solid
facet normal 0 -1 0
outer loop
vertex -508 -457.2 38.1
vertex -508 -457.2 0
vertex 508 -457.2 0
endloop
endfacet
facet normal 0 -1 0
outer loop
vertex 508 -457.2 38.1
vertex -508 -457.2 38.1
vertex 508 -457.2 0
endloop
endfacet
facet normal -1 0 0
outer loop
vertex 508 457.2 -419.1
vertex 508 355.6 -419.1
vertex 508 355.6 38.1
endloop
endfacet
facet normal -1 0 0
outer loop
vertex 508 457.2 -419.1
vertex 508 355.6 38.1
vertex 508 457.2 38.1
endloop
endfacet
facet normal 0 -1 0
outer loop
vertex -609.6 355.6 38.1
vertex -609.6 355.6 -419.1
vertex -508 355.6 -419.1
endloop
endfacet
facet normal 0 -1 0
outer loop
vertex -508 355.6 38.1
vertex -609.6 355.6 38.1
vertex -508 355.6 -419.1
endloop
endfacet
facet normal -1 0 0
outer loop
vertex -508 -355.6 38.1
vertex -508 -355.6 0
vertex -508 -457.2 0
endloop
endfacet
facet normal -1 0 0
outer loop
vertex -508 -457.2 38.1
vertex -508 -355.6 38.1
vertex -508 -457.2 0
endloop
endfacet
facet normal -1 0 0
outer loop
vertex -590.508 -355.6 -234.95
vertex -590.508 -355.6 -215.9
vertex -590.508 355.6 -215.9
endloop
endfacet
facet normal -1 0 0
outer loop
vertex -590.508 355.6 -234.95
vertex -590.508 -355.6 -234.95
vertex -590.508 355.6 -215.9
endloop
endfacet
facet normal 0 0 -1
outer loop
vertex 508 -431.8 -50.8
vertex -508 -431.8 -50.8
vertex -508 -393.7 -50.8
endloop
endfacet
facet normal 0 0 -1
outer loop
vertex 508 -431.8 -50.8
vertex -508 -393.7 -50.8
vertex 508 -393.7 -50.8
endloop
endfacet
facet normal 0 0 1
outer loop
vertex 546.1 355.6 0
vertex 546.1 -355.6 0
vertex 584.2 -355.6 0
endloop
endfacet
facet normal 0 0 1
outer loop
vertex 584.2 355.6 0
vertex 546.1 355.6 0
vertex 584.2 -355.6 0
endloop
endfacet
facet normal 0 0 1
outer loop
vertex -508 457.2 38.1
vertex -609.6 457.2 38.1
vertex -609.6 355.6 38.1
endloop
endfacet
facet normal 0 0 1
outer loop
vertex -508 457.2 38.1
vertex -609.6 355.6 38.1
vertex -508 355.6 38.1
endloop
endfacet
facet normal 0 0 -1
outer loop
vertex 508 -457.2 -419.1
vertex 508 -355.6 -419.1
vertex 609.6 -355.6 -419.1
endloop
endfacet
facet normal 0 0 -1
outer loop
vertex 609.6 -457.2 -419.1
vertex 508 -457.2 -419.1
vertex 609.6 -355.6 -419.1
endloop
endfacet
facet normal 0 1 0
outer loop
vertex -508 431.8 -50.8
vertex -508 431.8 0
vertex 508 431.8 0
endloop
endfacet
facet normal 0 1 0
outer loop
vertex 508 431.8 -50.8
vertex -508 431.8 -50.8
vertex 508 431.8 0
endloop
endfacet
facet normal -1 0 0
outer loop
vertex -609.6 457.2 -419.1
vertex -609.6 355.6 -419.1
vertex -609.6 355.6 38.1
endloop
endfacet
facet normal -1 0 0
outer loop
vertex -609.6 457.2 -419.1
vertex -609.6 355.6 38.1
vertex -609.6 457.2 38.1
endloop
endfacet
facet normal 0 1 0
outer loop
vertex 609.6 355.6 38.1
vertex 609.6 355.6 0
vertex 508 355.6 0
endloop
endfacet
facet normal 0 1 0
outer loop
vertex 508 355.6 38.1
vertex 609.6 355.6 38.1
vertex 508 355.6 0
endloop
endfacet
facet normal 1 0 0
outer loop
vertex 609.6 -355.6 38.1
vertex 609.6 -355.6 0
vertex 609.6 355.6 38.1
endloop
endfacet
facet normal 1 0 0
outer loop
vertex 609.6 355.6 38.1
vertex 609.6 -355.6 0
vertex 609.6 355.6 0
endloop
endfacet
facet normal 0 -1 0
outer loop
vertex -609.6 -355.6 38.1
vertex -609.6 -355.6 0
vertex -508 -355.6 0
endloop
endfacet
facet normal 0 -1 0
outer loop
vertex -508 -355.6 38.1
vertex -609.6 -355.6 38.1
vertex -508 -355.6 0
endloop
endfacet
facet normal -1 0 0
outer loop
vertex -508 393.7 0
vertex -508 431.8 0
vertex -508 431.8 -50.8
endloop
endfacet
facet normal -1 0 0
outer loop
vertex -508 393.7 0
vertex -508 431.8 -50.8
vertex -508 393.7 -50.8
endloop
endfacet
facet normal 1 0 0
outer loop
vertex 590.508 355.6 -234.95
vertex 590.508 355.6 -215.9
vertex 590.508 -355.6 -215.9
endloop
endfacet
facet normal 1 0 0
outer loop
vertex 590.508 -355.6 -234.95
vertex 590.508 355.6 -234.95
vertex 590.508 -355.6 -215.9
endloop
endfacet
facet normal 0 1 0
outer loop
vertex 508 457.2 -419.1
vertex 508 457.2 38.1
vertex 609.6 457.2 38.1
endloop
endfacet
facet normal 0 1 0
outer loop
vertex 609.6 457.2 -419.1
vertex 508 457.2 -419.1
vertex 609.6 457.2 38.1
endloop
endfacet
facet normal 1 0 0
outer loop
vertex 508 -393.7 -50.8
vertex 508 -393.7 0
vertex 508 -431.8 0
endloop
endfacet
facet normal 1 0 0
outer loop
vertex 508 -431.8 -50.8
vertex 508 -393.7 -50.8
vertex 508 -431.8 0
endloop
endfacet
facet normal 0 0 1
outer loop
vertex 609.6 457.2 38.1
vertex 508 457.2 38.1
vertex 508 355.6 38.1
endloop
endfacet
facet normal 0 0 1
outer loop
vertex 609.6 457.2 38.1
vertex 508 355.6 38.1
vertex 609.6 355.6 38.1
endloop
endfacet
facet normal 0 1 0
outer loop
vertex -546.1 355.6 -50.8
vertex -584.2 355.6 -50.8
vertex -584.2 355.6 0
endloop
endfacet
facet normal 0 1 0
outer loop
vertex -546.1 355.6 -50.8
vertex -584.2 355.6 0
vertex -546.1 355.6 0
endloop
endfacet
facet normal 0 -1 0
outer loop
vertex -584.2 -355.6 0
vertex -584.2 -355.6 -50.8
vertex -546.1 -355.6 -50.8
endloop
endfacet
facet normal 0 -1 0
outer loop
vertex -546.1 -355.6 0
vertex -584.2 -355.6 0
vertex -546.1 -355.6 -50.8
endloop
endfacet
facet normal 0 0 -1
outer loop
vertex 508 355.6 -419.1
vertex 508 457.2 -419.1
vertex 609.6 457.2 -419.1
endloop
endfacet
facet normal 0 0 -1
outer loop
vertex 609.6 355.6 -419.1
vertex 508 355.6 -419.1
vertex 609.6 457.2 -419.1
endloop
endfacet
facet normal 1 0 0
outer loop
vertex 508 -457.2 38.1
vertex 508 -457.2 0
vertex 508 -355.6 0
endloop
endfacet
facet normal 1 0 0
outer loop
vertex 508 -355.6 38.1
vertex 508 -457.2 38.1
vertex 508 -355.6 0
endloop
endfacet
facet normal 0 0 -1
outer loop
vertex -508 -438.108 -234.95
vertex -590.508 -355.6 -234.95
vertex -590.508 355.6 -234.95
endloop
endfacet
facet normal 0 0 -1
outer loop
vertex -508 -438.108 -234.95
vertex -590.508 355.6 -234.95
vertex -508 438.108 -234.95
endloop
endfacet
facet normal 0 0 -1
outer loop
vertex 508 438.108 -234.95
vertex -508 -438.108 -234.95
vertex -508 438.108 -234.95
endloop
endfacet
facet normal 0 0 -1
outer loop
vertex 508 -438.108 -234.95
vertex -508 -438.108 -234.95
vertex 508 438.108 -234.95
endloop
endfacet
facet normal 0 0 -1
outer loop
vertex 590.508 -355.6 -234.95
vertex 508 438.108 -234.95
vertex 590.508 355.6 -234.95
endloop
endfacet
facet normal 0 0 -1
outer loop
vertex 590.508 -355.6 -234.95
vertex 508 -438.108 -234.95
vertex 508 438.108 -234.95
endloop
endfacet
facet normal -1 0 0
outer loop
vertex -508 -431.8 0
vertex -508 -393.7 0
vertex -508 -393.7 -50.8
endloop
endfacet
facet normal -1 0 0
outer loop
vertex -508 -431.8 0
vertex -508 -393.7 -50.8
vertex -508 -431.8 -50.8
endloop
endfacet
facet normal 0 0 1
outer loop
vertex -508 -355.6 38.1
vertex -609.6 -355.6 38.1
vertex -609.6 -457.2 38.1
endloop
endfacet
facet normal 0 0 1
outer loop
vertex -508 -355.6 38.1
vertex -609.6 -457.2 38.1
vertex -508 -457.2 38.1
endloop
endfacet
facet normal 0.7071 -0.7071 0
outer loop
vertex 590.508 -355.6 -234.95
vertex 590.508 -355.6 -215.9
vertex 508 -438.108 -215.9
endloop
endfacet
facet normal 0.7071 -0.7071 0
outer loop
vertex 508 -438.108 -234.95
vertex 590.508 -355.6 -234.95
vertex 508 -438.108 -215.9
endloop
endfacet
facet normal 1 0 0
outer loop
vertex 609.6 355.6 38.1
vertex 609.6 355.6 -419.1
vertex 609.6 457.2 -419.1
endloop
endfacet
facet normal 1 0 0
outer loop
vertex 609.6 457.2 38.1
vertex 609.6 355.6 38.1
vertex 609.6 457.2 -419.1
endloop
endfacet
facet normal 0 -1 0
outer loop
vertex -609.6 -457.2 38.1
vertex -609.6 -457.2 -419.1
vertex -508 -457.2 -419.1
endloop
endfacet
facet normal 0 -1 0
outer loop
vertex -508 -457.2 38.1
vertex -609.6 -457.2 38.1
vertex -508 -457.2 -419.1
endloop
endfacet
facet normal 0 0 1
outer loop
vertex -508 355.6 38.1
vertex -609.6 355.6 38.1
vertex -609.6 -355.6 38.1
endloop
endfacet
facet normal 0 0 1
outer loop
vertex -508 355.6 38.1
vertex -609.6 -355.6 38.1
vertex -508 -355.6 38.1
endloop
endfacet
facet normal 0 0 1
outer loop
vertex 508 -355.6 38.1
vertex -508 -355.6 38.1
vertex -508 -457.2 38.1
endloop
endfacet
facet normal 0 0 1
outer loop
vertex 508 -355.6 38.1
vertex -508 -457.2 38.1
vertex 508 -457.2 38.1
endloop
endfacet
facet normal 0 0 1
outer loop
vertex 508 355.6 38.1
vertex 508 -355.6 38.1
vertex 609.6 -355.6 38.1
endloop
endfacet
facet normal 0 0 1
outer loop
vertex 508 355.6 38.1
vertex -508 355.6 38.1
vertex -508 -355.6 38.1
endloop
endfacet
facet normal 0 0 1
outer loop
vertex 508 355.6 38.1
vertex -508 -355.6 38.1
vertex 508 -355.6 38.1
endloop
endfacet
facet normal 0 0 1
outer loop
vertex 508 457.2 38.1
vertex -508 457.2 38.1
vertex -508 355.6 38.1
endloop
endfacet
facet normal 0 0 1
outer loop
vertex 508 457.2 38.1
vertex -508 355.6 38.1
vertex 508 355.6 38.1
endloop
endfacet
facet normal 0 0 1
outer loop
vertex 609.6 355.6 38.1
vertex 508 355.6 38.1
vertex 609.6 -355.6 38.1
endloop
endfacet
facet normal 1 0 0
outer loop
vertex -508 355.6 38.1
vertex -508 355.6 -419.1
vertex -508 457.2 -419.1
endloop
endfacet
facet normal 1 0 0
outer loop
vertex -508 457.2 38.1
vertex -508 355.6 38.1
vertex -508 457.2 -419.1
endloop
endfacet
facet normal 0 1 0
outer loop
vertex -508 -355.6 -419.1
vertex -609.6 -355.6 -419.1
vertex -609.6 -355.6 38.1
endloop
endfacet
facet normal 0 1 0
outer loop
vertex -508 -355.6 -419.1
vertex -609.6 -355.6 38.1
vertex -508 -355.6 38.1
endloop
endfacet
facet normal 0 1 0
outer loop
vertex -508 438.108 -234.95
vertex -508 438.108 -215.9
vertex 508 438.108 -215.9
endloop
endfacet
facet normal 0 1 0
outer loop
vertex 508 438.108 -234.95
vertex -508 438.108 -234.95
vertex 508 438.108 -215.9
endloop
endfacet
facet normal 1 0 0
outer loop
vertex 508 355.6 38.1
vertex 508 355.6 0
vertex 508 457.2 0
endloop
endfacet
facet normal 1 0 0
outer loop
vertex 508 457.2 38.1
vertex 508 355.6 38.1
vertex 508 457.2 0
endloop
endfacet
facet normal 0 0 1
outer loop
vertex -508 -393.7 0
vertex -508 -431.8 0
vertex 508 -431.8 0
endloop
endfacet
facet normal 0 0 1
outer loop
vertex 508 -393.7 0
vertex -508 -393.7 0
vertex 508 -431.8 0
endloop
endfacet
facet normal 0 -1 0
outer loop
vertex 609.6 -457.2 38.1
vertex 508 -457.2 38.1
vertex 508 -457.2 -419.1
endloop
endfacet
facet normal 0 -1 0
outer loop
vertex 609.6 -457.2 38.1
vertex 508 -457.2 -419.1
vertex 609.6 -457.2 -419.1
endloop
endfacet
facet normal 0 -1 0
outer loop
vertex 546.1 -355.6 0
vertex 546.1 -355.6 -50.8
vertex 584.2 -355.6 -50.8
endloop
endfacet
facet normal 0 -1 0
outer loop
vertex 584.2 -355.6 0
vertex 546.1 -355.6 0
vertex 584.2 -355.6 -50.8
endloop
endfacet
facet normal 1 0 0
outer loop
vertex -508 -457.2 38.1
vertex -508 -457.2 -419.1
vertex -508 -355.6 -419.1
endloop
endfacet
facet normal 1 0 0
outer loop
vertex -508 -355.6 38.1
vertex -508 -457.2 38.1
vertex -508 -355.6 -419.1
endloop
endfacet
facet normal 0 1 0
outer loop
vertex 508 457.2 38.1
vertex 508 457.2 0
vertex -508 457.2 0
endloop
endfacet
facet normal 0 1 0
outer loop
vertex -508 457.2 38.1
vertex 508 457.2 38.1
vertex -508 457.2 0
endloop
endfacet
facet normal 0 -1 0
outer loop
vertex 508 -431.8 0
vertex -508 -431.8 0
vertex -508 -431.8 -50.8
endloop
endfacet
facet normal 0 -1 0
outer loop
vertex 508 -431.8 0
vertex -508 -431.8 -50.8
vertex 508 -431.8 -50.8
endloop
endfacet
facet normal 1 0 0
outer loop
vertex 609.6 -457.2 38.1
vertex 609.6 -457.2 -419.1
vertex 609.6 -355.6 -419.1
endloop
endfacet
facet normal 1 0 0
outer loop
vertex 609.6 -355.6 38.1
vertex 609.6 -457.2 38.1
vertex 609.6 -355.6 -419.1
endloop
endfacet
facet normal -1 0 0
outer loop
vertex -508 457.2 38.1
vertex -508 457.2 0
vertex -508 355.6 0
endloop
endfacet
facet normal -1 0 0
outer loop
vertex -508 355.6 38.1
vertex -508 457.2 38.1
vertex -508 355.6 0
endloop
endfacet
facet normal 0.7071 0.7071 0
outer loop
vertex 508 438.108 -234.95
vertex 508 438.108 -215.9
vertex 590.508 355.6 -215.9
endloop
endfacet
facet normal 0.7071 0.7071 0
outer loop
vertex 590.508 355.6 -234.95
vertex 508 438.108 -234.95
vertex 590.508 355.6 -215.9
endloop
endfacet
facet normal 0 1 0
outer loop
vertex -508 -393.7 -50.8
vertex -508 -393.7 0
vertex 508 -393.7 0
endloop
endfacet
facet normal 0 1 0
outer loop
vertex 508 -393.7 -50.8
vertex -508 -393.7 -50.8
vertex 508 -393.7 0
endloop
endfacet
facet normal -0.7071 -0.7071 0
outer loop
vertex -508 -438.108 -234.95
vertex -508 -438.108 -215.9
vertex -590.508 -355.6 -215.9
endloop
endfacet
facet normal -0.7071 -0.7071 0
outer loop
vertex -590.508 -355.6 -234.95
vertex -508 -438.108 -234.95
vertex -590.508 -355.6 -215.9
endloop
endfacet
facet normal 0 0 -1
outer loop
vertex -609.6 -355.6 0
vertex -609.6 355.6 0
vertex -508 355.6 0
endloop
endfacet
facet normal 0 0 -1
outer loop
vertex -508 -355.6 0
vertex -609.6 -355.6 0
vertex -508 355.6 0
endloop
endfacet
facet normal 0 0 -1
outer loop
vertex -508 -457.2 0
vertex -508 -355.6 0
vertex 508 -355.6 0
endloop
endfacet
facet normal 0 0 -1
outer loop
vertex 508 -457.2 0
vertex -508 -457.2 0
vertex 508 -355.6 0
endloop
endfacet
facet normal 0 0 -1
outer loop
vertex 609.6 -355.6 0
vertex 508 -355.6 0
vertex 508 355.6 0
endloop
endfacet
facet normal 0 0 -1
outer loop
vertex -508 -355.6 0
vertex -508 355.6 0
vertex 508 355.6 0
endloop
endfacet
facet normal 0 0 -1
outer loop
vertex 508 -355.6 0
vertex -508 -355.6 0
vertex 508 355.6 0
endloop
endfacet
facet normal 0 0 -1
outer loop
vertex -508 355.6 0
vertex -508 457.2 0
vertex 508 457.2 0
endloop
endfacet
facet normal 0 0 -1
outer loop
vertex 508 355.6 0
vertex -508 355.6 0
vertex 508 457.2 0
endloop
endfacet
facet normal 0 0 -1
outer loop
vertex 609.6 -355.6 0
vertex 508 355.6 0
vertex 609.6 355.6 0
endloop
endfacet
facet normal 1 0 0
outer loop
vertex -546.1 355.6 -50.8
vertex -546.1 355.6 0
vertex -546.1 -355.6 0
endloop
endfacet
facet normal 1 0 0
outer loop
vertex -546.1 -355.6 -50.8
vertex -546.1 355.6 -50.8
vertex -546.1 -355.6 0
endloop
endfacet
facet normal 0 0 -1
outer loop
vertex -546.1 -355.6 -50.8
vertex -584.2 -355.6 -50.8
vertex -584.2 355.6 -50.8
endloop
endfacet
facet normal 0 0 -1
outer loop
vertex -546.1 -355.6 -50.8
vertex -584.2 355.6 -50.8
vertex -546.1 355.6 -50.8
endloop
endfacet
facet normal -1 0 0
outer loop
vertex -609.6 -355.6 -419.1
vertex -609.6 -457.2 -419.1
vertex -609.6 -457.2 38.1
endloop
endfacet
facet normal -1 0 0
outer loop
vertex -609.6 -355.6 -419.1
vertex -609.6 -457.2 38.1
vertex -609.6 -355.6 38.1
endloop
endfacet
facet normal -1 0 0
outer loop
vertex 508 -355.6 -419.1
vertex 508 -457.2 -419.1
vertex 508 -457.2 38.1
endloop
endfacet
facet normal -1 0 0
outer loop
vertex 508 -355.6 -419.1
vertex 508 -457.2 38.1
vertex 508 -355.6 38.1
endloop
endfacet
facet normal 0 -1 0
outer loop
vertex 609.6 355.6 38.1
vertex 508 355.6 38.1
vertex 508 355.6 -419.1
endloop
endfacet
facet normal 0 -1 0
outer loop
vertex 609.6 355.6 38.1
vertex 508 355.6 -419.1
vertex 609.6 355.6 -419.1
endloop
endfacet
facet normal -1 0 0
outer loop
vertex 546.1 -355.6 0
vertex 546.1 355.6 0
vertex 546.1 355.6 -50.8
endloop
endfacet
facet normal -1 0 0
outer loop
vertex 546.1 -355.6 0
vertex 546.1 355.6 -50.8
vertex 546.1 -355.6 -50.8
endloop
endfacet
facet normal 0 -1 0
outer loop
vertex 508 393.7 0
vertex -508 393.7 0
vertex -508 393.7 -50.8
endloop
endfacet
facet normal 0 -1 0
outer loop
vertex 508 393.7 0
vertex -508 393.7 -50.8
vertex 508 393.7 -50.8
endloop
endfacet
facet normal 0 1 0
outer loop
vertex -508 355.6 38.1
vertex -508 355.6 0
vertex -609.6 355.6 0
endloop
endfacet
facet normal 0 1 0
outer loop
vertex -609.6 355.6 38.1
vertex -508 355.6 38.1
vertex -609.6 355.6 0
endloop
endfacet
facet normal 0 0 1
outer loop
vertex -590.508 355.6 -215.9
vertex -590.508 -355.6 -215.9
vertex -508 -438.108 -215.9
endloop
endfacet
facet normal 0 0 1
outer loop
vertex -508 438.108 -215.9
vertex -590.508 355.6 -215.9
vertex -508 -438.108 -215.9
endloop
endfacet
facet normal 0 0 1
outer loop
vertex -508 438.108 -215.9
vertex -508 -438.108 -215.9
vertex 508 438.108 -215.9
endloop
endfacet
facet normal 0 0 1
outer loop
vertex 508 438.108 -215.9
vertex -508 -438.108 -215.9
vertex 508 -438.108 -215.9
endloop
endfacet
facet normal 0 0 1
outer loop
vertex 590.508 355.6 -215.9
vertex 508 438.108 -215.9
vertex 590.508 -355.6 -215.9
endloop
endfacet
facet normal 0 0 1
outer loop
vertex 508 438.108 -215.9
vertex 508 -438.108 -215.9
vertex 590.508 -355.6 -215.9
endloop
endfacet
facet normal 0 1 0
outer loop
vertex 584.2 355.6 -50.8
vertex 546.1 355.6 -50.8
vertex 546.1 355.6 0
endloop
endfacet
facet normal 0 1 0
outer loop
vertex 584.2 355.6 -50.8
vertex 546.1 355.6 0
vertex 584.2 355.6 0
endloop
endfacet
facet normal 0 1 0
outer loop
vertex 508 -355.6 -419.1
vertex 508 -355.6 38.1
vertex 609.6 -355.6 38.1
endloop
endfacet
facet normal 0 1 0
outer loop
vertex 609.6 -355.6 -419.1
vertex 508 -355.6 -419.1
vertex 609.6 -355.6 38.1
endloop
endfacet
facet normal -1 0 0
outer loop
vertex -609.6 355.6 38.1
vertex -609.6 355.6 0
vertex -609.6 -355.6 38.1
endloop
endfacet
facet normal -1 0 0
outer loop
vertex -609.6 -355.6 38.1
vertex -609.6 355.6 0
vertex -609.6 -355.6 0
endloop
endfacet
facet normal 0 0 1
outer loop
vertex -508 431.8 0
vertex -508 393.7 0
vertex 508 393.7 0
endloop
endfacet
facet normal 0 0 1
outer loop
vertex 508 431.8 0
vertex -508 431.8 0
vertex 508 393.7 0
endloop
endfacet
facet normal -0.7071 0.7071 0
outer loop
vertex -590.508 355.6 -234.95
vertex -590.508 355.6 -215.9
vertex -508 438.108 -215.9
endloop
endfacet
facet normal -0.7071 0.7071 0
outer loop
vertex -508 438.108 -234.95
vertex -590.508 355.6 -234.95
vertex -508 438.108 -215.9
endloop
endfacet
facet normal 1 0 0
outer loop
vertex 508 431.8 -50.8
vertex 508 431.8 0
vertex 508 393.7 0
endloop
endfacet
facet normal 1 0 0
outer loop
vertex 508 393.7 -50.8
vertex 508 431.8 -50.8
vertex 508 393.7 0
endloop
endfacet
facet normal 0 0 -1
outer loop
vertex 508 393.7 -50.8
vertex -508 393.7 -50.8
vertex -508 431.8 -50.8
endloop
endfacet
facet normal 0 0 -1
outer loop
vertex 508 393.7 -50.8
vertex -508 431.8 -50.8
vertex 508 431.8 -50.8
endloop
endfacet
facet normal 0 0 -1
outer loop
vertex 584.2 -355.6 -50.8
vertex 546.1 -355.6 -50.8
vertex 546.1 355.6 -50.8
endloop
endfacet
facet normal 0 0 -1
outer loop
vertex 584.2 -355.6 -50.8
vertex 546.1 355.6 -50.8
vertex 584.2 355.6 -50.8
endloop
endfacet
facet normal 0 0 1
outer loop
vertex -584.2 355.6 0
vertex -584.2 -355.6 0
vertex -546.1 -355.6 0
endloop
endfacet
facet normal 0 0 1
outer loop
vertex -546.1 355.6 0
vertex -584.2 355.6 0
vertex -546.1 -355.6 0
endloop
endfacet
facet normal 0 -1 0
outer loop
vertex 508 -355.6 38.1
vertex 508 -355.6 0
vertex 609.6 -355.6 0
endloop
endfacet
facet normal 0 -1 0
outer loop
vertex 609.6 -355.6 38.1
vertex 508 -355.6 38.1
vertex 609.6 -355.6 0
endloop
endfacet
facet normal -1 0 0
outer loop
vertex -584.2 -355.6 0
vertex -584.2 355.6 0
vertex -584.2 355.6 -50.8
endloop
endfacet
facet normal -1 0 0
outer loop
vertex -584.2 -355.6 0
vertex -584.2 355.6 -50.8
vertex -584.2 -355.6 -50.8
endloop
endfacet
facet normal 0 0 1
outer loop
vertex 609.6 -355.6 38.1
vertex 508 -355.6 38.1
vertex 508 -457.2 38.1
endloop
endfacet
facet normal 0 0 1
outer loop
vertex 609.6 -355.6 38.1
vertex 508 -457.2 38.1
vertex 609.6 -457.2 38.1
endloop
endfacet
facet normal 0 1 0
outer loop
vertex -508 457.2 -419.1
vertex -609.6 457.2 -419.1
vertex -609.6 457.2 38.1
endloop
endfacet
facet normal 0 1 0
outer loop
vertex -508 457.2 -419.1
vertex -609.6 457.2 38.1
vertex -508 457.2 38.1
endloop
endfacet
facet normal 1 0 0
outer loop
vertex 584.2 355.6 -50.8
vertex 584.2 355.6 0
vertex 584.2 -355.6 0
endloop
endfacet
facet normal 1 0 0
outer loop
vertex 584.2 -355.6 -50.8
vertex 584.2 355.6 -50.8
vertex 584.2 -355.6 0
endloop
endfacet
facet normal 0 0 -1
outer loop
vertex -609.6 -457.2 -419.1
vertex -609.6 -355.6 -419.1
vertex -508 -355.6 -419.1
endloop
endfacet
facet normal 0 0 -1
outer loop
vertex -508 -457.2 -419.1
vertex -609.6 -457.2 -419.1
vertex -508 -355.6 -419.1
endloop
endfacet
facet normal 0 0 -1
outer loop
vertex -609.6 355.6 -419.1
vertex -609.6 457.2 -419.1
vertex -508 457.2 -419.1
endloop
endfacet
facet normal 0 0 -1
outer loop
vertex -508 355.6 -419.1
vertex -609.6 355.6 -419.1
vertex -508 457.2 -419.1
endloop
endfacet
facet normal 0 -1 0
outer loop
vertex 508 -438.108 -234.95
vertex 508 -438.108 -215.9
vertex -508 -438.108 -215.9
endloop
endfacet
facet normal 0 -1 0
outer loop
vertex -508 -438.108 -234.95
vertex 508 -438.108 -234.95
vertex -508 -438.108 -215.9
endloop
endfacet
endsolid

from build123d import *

# Parameters (mm, degrees)
F3_DEPTH  = 38.1
F4_W      = 101.6
F4_H      = 101.6
F5_DEPTH  = 457.2
F8_DEPTH  = 19.05
F9_W      = 1016
F9_H      = 38.1
F10_DEPTH = 50.8
F9_W_2    = 38.1
F9_H_2    = 711.2


with BuildPart() as f3:
    # F2 (on Top) → F3 (new body)
    with BuildSketch(Plane.XY):
        Polygon((-508, 355.6), (-609.6, 355.6), (-609.6, -355.6), (-508, -355.6), (-508, -457.2), (508, -457.2), (508, -355.6), (609.6, -355.6), (609.6, 355.6), (508, 355.6), (508, 457.2), (-508, 457.2), align=None)
    extrude(amount=F3_DEPTH)


with BuildPart() as f5:
    # F4 (on face) → F5 (new body)
    with BuildSketch(Plane.XY.offset(38.1)):
        with Locations((-558.8, -406.4)):
            Rectangle(F4_W, F4_H)
    extrude(amount=-F5_DEPTH)


with BuildPart() as f5b:
    # F4 (on face) → F5, piece 2 (new body)
    with BuildSketch(Plane.XY.offset(38.1)):
        with Locations((558.8, -406.4)):
            Rectangle(F4_W, F4_H)
    extrude(amount=-F5_DEPTH)


with BuildPart() as f5c:
    # F4 (on face) → F5, piece 3 (new body)
    with BuildSketch(Plane.XY.offset(38.1)):
        with Locations((558.8, 406.4)):
            Rectangle(F4_W, F4_H)
    extrude(amount=-F5_DEPTH)


with BuildPart() as f5d:
    # F4 (on face) → F5, piece 4 (new body)
    with BuildSketch(Plane.XY.offset(38.1)):
        with Locations((-558.8, 406.4)):
            Rectangle(F4_W, F4_H)
    extrude(amount=-F5_DEPTH)


with BuildPart() as f8:
    # F7 (on offset) → F8 (new body)
    with BuildSketch(Plane(origin=(0, 0, -215.9), x_dir=(1, 0, 0), z_dir=(0, 0, -1))):
        Polygon((508, 438.1079459667), (-508, 438.1079459667), (-590.5079459667, 355.6), (-590.5079459667, -355.6), (-508, -438.1079459667), (508, -438.1079459667), (590.5079459667, -355.6), (590.5079459667, 355.6), align=None)
    extrude(amount=F8_DEPTH)


with BuildPart() as f10:
    # F9 (on face) → F10 (new body)
    with BuildSketch(Plane(origin=(0, 0, 0), x_dir=(1, 0, 0), z_dir=(0, 0, -1))):
        with Locations((0, 412.75)):
            Rectangle(F9_W, F9_H)
    extrude(amount=F10_DEPTH)


with BuildPart() as f10b:
    # F9 (on face) → F10, piece 2 (new body)
    with BuildSketch(Plane(origin=(0, 0, 0), x_dir=(1, 0, 0), z_dir=(0, 0, -1))):
        with Locations((565.15, 0)):
            Rectangle(F9_W_2, F9_H_2)
    extrude(amount=F10_DEPTH)


with BuildPart() as f10c:
    # F9 (on face) → F10, piece 3 (new body)
    with BuildSketch(Plane(origin=(0, 0, 0), x_dir=(1, 0, 0), z_dir=(0, 0, -1))):
        with Locations((0, -412.75)):
            Rectangle(F9_W, F9_H)
    extrude(amount=F10_DEPTH)


with BuildPart() as f10d:
    # F9 (on face) → F10, piece 4 (new body)
    with BuildSketch(Plane(origin=(0, 0, 0), x_dir=(1, 0, 0), z_dir=(0, 0, -1))):
        with Locations((-565.15, 0)):
            Rectangle(F9_W_2, F9_H_2)
    extrude(amount=F10_DEPTH)


solid = Compound([f3.part, f5.part, f5b.part, f5c.part, f5d.part, f8.part, f10.part, f10b.part, f10c.part, f10d.part])
